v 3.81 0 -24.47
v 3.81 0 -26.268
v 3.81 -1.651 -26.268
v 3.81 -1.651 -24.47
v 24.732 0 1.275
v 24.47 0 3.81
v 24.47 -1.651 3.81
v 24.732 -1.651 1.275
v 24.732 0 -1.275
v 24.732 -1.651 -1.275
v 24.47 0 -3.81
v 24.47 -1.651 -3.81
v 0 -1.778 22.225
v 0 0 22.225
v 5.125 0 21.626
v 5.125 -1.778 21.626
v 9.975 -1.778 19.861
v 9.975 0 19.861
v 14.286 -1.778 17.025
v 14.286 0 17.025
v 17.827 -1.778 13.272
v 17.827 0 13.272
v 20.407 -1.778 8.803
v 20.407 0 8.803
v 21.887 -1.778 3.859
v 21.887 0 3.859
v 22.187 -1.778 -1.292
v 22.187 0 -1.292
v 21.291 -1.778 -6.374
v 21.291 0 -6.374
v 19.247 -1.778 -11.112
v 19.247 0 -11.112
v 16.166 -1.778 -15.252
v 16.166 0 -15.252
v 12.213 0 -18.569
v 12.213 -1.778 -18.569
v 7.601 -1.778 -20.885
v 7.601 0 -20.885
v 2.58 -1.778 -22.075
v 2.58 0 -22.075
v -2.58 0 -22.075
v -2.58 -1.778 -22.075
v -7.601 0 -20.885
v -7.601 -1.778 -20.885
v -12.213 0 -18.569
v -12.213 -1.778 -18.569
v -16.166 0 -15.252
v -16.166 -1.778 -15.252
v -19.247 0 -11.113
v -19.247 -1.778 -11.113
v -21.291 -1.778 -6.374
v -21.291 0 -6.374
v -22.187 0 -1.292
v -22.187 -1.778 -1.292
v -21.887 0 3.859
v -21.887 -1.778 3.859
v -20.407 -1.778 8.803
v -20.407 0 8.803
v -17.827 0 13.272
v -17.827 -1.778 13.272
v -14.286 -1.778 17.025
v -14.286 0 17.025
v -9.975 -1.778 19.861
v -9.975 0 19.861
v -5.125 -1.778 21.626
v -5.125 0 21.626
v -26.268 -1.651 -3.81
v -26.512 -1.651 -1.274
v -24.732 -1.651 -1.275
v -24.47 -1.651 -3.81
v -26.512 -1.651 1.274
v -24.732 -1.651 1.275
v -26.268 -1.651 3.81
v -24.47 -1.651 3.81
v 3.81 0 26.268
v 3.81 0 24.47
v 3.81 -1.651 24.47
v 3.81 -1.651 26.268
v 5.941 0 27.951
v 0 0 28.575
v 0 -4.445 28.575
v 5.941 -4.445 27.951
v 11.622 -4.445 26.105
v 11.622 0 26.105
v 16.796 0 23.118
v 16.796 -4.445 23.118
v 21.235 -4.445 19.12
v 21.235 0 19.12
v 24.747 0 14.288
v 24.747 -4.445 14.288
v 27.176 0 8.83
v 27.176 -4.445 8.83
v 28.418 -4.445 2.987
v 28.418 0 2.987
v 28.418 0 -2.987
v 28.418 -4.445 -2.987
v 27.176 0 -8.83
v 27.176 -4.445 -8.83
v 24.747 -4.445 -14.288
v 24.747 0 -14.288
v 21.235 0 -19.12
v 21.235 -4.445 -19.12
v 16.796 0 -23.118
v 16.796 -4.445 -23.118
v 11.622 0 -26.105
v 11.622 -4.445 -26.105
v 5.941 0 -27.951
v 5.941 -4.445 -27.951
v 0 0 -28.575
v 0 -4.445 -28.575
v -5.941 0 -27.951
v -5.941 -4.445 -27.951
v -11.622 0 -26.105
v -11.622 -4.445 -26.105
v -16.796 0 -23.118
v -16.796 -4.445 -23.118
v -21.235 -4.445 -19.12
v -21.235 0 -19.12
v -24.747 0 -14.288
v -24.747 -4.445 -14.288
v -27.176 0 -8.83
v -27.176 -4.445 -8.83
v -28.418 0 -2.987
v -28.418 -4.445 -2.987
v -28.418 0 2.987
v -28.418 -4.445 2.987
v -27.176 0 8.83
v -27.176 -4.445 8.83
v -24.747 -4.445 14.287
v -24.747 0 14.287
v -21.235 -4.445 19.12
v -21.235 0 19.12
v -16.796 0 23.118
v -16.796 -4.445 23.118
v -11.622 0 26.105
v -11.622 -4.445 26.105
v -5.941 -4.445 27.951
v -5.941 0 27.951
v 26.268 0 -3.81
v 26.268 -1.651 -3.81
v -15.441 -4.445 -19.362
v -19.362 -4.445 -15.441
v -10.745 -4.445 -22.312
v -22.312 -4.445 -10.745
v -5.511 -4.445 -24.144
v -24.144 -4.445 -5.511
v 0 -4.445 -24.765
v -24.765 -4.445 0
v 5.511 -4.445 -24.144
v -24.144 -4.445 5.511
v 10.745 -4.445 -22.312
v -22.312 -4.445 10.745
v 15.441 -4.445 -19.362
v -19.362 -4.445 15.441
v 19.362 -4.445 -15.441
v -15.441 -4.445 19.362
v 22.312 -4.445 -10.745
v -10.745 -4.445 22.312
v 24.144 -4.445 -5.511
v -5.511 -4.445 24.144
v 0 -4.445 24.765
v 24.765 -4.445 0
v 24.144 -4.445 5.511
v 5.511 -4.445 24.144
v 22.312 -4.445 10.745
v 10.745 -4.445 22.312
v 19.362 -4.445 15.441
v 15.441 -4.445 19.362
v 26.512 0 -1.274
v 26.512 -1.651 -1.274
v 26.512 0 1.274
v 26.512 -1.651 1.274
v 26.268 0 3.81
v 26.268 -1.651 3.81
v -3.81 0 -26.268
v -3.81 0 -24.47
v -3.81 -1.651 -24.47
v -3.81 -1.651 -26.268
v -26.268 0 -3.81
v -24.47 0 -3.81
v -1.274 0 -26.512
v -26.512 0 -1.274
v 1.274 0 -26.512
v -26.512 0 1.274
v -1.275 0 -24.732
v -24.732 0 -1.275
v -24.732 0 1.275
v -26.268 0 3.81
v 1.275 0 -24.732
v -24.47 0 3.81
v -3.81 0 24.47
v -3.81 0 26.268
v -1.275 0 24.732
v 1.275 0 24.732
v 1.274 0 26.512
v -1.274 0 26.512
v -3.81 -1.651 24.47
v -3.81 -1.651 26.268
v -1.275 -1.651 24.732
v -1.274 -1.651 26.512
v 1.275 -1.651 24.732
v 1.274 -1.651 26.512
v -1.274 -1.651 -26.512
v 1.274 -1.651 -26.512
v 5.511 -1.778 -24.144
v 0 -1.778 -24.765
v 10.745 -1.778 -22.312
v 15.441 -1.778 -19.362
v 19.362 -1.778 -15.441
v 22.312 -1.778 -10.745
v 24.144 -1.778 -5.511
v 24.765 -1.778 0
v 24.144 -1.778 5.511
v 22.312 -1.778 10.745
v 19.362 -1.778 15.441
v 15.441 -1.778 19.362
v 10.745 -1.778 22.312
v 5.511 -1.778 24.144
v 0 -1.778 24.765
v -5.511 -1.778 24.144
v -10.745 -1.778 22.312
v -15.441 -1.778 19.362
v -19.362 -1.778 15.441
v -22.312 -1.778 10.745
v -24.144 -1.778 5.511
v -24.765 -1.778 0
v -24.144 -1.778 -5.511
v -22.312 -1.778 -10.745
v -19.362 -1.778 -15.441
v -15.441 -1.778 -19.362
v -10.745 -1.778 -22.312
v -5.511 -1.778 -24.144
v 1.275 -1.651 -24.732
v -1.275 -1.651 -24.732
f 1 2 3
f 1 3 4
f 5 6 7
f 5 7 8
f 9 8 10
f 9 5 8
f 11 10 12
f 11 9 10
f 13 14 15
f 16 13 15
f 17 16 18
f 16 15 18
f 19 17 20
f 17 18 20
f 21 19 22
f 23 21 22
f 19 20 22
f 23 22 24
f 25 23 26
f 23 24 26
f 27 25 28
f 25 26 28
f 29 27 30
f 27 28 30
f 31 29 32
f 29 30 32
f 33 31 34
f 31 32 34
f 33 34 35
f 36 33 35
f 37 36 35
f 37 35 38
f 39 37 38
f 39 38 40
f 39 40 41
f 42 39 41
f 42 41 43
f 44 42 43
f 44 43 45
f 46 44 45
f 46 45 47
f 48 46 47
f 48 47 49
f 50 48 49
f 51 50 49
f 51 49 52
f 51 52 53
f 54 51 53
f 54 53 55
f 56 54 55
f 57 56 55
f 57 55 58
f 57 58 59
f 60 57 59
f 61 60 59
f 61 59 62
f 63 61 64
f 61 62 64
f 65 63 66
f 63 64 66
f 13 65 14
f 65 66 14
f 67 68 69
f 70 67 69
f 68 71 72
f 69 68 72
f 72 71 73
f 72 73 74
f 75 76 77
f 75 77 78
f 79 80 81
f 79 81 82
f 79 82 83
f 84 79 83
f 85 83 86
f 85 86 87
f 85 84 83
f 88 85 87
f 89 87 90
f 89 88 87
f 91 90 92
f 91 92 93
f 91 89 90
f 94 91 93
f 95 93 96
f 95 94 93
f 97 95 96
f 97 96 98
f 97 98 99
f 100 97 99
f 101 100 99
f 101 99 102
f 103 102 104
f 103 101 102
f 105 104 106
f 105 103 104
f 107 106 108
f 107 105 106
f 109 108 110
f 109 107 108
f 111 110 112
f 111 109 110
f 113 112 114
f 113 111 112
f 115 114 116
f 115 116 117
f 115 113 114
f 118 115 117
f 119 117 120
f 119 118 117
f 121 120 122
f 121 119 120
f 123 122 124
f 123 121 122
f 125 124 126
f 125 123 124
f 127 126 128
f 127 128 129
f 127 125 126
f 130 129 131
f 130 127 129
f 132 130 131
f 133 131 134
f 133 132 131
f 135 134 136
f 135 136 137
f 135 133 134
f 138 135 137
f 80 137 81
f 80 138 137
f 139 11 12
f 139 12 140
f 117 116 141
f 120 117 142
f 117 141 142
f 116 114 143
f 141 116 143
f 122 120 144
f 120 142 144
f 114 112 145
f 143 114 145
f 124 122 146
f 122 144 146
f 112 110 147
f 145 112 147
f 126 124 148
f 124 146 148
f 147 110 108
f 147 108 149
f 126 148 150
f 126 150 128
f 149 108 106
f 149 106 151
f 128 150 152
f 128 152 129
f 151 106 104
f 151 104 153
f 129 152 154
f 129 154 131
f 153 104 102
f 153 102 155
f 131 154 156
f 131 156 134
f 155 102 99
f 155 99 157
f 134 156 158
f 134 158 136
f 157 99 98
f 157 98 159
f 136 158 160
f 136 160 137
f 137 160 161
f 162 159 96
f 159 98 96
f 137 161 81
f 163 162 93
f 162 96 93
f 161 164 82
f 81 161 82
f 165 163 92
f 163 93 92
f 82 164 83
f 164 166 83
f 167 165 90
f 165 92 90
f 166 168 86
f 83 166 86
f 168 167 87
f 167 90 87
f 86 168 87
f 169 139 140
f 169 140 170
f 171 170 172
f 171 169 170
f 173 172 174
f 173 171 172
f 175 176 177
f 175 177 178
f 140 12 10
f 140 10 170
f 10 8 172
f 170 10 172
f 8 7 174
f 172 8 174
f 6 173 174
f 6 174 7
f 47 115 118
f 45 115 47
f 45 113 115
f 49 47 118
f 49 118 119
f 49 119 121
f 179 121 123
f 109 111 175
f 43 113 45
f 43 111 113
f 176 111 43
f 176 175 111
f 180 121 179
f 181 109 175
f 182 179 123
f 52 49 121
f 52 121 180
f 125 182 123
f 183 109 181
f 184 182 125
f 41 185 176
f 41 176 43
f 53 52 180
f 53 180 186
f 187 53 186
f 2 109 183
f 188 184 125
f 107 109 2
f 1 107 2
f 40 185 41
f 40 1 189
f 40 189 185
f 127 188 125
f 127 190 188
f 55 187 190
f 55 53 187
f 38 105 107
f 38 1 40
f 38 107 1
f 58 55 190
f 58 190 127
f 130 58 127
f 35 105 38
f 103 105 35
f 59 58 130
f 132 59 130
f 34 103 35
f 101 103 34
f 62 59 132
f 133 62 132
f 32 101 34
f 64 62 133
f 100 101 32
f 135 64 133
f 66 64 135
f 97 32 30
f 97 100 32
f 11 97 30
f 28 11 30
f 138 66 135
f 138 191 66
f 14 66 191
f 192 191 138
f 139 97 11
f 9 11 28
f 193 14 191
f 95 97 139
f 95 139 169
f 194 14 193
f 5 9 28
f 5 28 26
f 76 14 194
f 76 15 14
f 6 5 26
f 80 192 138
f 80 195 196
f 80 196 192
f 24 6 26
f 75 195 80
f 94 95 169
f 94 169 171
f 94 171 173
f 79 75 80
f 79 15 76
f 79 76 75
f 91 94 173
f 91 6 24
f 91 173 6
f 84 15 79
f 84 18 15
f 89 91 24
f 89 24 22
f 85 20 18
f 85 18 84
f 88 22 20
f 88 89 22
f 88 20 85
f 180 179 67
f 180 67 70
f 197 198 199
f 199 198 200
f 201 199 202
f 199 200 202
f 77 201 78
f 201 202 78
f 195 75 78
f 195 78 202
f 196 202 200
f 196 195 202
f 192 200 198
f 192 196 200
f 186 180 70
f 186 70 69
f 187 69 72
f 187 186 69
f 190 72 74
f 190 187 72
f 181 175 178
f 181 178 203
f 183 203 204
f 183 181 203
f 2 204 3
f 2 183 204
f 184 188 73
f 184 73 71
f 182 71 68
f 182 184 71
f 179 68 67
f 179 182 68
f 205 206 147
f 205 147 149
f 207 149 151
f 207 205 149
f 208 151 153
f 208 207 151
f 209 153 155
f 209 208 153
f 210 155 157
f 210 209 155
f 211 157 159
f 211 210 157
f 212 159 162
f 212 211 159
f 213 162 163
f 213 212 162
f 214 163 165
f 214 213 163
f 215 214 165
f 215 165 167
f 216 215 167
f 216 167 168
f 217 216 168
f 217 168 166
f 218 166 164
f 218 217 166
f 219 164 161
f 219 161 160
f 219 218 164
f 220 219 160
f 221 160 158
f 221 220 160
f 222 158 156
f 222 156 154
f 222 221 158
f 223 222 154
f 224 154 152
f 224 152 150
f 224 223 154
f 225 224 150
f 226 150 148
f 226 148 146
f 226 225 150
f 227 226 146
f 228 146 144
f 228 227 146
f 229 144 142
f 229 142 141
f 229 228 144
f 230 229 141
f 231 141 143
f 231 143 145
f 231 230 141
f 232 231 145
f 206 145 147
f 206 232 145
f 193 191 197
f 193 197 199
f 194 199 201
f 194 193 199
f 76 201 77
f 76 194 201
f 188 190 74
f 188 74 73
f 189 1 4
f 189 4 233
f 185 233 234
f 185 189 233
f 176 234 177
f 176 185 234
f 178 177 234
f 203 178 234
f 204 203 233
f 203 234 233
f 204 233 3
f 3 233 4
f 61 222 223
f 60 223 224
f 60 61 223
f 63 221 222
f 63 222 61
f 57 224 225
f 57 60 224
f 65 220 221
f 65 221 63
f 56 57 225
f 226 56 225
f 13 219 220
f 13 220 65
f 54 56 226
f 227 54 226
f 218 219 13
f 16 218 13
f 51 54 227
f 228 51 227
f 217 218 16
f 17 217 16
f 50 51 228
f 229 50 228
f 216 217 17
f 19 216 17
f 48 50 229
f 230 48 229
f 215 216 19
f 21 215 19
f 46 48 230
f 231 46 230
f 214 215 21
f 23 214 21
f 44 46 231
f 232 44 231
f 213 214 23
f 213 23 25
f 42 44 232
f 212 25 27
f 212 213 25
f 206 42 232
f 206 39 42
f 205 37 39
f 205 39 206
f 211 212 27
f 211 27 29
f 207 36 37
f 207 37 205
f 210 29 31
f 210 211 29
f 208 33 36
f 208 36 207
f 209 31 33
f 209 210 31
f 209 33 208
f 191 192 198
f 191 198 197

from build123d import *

# Parameters (mm, degrees)
SKETCH1_R            = 28.575
SHAFT_DEPTH          = 4.445
SKETCH11_R           = 22.225
THRU_HOLE_DEPTH      = 41.654880088
TOOLING_POINTS_DEPTH = 1.651
RETAINER_START       = -2.667
SKETCH12_R           = 24.765
RETAINER_HOLE_DEPTH  = 2.667


with BuildPart() as part:
    # Sketch1 → Shaft (new body)
    with BuildSketch(Plane(origin=(0, 0, 0), x_dir=(1, 0, 0), z_dir=(0, 1, 0))):
        Circle(SKETCH1_R)
    extrude(amount=-SHAFT_DEPTH)

    # Sketch11 → Thru Hole (cut, through all)
    with BuildSketch(Plane(origin=(0, 0, 0), x_dir=(-1, 0, 0), z_dir=(0, 1, 0))):
        Circle(SKETCH11_R)
    extrude(amount=-THRU_HOLE_DEPTH, mode=Mode.SUBTRACT)

    # Sketch13 → Tooling Points (cut)
    with BuildSketch(Plane(origin=(0, 0, 0), x_dir=(-1, 0, 0), z_dir=(0, 1, 0))):
        with BuildLine():
            Line((-24.470168062, -3.81), (-26.268131814, -3.81))
            ThreePointArc((-26.268131814, -3.81), (-26.543, 0), (-26.268131814, 3.81))
            Line((-26.268131814, 3.81), (-24.470168062, 3.81))
            ThreePointArc((-24.470168062, 3.81), (-24.765, 0), (-24.470168062, -3.81))
        make_face()
        with BuildLine():
            Line((3.81, -24.470168062), (3.81, -26.268131814))
            ThreePointArc((3.81, -26.268131814), (0, -26.543), (-3.81, -26.268131814))
            Line((-3.81, -26.268131814), (-3.81, -24.470168062))
            ThreePointArc((-3.81, -24.470168062), (0, -24.765), (3.81, -24.470168062))
        make_face()
        with BuildLine():
            Line((24.470168062, 3.81), (26.268131814, 3.81))
            ThreePointArc((26.268131814, 3.81), (26.543, 0), (26.268131814, -3.81))
            Line((26.268131814, -3.81), (24.470168062, -3.81))
            ThreePointArc((24.470168062, -3.81), (24.765, 0), (24.470168062, 3.81))
        make_face()
        with BuildLine():
            Line((-3.81, 24.470168062), (-3.81, 26.268131814))
            ThreePointArc((-3.81, 26.268131814), (0, 26.543), (3.81, 26.268131814))
            Line((3.81, 26.268131814), (3.81, 24.470168062))
            ThreePointArc((3.81, 24.470168062), (0, 24.765), (-3.81, 24.470168062))
        make_face()
    extrude(amount=-TOOLING_POINTS_DEPTH, mode=Mode.SUBTRACT)

    # Sketch12 → Retainer Hole (cut)
    with BuildSketch(Plane.XZ.offset(4.445).offset(RETAINER_START)):
        Circle(SKETCH12_R)
    extrude(amount=RETAINER_HOLE_DEPTH, mode=Mode.SUBTRACT)


solid = part.part
